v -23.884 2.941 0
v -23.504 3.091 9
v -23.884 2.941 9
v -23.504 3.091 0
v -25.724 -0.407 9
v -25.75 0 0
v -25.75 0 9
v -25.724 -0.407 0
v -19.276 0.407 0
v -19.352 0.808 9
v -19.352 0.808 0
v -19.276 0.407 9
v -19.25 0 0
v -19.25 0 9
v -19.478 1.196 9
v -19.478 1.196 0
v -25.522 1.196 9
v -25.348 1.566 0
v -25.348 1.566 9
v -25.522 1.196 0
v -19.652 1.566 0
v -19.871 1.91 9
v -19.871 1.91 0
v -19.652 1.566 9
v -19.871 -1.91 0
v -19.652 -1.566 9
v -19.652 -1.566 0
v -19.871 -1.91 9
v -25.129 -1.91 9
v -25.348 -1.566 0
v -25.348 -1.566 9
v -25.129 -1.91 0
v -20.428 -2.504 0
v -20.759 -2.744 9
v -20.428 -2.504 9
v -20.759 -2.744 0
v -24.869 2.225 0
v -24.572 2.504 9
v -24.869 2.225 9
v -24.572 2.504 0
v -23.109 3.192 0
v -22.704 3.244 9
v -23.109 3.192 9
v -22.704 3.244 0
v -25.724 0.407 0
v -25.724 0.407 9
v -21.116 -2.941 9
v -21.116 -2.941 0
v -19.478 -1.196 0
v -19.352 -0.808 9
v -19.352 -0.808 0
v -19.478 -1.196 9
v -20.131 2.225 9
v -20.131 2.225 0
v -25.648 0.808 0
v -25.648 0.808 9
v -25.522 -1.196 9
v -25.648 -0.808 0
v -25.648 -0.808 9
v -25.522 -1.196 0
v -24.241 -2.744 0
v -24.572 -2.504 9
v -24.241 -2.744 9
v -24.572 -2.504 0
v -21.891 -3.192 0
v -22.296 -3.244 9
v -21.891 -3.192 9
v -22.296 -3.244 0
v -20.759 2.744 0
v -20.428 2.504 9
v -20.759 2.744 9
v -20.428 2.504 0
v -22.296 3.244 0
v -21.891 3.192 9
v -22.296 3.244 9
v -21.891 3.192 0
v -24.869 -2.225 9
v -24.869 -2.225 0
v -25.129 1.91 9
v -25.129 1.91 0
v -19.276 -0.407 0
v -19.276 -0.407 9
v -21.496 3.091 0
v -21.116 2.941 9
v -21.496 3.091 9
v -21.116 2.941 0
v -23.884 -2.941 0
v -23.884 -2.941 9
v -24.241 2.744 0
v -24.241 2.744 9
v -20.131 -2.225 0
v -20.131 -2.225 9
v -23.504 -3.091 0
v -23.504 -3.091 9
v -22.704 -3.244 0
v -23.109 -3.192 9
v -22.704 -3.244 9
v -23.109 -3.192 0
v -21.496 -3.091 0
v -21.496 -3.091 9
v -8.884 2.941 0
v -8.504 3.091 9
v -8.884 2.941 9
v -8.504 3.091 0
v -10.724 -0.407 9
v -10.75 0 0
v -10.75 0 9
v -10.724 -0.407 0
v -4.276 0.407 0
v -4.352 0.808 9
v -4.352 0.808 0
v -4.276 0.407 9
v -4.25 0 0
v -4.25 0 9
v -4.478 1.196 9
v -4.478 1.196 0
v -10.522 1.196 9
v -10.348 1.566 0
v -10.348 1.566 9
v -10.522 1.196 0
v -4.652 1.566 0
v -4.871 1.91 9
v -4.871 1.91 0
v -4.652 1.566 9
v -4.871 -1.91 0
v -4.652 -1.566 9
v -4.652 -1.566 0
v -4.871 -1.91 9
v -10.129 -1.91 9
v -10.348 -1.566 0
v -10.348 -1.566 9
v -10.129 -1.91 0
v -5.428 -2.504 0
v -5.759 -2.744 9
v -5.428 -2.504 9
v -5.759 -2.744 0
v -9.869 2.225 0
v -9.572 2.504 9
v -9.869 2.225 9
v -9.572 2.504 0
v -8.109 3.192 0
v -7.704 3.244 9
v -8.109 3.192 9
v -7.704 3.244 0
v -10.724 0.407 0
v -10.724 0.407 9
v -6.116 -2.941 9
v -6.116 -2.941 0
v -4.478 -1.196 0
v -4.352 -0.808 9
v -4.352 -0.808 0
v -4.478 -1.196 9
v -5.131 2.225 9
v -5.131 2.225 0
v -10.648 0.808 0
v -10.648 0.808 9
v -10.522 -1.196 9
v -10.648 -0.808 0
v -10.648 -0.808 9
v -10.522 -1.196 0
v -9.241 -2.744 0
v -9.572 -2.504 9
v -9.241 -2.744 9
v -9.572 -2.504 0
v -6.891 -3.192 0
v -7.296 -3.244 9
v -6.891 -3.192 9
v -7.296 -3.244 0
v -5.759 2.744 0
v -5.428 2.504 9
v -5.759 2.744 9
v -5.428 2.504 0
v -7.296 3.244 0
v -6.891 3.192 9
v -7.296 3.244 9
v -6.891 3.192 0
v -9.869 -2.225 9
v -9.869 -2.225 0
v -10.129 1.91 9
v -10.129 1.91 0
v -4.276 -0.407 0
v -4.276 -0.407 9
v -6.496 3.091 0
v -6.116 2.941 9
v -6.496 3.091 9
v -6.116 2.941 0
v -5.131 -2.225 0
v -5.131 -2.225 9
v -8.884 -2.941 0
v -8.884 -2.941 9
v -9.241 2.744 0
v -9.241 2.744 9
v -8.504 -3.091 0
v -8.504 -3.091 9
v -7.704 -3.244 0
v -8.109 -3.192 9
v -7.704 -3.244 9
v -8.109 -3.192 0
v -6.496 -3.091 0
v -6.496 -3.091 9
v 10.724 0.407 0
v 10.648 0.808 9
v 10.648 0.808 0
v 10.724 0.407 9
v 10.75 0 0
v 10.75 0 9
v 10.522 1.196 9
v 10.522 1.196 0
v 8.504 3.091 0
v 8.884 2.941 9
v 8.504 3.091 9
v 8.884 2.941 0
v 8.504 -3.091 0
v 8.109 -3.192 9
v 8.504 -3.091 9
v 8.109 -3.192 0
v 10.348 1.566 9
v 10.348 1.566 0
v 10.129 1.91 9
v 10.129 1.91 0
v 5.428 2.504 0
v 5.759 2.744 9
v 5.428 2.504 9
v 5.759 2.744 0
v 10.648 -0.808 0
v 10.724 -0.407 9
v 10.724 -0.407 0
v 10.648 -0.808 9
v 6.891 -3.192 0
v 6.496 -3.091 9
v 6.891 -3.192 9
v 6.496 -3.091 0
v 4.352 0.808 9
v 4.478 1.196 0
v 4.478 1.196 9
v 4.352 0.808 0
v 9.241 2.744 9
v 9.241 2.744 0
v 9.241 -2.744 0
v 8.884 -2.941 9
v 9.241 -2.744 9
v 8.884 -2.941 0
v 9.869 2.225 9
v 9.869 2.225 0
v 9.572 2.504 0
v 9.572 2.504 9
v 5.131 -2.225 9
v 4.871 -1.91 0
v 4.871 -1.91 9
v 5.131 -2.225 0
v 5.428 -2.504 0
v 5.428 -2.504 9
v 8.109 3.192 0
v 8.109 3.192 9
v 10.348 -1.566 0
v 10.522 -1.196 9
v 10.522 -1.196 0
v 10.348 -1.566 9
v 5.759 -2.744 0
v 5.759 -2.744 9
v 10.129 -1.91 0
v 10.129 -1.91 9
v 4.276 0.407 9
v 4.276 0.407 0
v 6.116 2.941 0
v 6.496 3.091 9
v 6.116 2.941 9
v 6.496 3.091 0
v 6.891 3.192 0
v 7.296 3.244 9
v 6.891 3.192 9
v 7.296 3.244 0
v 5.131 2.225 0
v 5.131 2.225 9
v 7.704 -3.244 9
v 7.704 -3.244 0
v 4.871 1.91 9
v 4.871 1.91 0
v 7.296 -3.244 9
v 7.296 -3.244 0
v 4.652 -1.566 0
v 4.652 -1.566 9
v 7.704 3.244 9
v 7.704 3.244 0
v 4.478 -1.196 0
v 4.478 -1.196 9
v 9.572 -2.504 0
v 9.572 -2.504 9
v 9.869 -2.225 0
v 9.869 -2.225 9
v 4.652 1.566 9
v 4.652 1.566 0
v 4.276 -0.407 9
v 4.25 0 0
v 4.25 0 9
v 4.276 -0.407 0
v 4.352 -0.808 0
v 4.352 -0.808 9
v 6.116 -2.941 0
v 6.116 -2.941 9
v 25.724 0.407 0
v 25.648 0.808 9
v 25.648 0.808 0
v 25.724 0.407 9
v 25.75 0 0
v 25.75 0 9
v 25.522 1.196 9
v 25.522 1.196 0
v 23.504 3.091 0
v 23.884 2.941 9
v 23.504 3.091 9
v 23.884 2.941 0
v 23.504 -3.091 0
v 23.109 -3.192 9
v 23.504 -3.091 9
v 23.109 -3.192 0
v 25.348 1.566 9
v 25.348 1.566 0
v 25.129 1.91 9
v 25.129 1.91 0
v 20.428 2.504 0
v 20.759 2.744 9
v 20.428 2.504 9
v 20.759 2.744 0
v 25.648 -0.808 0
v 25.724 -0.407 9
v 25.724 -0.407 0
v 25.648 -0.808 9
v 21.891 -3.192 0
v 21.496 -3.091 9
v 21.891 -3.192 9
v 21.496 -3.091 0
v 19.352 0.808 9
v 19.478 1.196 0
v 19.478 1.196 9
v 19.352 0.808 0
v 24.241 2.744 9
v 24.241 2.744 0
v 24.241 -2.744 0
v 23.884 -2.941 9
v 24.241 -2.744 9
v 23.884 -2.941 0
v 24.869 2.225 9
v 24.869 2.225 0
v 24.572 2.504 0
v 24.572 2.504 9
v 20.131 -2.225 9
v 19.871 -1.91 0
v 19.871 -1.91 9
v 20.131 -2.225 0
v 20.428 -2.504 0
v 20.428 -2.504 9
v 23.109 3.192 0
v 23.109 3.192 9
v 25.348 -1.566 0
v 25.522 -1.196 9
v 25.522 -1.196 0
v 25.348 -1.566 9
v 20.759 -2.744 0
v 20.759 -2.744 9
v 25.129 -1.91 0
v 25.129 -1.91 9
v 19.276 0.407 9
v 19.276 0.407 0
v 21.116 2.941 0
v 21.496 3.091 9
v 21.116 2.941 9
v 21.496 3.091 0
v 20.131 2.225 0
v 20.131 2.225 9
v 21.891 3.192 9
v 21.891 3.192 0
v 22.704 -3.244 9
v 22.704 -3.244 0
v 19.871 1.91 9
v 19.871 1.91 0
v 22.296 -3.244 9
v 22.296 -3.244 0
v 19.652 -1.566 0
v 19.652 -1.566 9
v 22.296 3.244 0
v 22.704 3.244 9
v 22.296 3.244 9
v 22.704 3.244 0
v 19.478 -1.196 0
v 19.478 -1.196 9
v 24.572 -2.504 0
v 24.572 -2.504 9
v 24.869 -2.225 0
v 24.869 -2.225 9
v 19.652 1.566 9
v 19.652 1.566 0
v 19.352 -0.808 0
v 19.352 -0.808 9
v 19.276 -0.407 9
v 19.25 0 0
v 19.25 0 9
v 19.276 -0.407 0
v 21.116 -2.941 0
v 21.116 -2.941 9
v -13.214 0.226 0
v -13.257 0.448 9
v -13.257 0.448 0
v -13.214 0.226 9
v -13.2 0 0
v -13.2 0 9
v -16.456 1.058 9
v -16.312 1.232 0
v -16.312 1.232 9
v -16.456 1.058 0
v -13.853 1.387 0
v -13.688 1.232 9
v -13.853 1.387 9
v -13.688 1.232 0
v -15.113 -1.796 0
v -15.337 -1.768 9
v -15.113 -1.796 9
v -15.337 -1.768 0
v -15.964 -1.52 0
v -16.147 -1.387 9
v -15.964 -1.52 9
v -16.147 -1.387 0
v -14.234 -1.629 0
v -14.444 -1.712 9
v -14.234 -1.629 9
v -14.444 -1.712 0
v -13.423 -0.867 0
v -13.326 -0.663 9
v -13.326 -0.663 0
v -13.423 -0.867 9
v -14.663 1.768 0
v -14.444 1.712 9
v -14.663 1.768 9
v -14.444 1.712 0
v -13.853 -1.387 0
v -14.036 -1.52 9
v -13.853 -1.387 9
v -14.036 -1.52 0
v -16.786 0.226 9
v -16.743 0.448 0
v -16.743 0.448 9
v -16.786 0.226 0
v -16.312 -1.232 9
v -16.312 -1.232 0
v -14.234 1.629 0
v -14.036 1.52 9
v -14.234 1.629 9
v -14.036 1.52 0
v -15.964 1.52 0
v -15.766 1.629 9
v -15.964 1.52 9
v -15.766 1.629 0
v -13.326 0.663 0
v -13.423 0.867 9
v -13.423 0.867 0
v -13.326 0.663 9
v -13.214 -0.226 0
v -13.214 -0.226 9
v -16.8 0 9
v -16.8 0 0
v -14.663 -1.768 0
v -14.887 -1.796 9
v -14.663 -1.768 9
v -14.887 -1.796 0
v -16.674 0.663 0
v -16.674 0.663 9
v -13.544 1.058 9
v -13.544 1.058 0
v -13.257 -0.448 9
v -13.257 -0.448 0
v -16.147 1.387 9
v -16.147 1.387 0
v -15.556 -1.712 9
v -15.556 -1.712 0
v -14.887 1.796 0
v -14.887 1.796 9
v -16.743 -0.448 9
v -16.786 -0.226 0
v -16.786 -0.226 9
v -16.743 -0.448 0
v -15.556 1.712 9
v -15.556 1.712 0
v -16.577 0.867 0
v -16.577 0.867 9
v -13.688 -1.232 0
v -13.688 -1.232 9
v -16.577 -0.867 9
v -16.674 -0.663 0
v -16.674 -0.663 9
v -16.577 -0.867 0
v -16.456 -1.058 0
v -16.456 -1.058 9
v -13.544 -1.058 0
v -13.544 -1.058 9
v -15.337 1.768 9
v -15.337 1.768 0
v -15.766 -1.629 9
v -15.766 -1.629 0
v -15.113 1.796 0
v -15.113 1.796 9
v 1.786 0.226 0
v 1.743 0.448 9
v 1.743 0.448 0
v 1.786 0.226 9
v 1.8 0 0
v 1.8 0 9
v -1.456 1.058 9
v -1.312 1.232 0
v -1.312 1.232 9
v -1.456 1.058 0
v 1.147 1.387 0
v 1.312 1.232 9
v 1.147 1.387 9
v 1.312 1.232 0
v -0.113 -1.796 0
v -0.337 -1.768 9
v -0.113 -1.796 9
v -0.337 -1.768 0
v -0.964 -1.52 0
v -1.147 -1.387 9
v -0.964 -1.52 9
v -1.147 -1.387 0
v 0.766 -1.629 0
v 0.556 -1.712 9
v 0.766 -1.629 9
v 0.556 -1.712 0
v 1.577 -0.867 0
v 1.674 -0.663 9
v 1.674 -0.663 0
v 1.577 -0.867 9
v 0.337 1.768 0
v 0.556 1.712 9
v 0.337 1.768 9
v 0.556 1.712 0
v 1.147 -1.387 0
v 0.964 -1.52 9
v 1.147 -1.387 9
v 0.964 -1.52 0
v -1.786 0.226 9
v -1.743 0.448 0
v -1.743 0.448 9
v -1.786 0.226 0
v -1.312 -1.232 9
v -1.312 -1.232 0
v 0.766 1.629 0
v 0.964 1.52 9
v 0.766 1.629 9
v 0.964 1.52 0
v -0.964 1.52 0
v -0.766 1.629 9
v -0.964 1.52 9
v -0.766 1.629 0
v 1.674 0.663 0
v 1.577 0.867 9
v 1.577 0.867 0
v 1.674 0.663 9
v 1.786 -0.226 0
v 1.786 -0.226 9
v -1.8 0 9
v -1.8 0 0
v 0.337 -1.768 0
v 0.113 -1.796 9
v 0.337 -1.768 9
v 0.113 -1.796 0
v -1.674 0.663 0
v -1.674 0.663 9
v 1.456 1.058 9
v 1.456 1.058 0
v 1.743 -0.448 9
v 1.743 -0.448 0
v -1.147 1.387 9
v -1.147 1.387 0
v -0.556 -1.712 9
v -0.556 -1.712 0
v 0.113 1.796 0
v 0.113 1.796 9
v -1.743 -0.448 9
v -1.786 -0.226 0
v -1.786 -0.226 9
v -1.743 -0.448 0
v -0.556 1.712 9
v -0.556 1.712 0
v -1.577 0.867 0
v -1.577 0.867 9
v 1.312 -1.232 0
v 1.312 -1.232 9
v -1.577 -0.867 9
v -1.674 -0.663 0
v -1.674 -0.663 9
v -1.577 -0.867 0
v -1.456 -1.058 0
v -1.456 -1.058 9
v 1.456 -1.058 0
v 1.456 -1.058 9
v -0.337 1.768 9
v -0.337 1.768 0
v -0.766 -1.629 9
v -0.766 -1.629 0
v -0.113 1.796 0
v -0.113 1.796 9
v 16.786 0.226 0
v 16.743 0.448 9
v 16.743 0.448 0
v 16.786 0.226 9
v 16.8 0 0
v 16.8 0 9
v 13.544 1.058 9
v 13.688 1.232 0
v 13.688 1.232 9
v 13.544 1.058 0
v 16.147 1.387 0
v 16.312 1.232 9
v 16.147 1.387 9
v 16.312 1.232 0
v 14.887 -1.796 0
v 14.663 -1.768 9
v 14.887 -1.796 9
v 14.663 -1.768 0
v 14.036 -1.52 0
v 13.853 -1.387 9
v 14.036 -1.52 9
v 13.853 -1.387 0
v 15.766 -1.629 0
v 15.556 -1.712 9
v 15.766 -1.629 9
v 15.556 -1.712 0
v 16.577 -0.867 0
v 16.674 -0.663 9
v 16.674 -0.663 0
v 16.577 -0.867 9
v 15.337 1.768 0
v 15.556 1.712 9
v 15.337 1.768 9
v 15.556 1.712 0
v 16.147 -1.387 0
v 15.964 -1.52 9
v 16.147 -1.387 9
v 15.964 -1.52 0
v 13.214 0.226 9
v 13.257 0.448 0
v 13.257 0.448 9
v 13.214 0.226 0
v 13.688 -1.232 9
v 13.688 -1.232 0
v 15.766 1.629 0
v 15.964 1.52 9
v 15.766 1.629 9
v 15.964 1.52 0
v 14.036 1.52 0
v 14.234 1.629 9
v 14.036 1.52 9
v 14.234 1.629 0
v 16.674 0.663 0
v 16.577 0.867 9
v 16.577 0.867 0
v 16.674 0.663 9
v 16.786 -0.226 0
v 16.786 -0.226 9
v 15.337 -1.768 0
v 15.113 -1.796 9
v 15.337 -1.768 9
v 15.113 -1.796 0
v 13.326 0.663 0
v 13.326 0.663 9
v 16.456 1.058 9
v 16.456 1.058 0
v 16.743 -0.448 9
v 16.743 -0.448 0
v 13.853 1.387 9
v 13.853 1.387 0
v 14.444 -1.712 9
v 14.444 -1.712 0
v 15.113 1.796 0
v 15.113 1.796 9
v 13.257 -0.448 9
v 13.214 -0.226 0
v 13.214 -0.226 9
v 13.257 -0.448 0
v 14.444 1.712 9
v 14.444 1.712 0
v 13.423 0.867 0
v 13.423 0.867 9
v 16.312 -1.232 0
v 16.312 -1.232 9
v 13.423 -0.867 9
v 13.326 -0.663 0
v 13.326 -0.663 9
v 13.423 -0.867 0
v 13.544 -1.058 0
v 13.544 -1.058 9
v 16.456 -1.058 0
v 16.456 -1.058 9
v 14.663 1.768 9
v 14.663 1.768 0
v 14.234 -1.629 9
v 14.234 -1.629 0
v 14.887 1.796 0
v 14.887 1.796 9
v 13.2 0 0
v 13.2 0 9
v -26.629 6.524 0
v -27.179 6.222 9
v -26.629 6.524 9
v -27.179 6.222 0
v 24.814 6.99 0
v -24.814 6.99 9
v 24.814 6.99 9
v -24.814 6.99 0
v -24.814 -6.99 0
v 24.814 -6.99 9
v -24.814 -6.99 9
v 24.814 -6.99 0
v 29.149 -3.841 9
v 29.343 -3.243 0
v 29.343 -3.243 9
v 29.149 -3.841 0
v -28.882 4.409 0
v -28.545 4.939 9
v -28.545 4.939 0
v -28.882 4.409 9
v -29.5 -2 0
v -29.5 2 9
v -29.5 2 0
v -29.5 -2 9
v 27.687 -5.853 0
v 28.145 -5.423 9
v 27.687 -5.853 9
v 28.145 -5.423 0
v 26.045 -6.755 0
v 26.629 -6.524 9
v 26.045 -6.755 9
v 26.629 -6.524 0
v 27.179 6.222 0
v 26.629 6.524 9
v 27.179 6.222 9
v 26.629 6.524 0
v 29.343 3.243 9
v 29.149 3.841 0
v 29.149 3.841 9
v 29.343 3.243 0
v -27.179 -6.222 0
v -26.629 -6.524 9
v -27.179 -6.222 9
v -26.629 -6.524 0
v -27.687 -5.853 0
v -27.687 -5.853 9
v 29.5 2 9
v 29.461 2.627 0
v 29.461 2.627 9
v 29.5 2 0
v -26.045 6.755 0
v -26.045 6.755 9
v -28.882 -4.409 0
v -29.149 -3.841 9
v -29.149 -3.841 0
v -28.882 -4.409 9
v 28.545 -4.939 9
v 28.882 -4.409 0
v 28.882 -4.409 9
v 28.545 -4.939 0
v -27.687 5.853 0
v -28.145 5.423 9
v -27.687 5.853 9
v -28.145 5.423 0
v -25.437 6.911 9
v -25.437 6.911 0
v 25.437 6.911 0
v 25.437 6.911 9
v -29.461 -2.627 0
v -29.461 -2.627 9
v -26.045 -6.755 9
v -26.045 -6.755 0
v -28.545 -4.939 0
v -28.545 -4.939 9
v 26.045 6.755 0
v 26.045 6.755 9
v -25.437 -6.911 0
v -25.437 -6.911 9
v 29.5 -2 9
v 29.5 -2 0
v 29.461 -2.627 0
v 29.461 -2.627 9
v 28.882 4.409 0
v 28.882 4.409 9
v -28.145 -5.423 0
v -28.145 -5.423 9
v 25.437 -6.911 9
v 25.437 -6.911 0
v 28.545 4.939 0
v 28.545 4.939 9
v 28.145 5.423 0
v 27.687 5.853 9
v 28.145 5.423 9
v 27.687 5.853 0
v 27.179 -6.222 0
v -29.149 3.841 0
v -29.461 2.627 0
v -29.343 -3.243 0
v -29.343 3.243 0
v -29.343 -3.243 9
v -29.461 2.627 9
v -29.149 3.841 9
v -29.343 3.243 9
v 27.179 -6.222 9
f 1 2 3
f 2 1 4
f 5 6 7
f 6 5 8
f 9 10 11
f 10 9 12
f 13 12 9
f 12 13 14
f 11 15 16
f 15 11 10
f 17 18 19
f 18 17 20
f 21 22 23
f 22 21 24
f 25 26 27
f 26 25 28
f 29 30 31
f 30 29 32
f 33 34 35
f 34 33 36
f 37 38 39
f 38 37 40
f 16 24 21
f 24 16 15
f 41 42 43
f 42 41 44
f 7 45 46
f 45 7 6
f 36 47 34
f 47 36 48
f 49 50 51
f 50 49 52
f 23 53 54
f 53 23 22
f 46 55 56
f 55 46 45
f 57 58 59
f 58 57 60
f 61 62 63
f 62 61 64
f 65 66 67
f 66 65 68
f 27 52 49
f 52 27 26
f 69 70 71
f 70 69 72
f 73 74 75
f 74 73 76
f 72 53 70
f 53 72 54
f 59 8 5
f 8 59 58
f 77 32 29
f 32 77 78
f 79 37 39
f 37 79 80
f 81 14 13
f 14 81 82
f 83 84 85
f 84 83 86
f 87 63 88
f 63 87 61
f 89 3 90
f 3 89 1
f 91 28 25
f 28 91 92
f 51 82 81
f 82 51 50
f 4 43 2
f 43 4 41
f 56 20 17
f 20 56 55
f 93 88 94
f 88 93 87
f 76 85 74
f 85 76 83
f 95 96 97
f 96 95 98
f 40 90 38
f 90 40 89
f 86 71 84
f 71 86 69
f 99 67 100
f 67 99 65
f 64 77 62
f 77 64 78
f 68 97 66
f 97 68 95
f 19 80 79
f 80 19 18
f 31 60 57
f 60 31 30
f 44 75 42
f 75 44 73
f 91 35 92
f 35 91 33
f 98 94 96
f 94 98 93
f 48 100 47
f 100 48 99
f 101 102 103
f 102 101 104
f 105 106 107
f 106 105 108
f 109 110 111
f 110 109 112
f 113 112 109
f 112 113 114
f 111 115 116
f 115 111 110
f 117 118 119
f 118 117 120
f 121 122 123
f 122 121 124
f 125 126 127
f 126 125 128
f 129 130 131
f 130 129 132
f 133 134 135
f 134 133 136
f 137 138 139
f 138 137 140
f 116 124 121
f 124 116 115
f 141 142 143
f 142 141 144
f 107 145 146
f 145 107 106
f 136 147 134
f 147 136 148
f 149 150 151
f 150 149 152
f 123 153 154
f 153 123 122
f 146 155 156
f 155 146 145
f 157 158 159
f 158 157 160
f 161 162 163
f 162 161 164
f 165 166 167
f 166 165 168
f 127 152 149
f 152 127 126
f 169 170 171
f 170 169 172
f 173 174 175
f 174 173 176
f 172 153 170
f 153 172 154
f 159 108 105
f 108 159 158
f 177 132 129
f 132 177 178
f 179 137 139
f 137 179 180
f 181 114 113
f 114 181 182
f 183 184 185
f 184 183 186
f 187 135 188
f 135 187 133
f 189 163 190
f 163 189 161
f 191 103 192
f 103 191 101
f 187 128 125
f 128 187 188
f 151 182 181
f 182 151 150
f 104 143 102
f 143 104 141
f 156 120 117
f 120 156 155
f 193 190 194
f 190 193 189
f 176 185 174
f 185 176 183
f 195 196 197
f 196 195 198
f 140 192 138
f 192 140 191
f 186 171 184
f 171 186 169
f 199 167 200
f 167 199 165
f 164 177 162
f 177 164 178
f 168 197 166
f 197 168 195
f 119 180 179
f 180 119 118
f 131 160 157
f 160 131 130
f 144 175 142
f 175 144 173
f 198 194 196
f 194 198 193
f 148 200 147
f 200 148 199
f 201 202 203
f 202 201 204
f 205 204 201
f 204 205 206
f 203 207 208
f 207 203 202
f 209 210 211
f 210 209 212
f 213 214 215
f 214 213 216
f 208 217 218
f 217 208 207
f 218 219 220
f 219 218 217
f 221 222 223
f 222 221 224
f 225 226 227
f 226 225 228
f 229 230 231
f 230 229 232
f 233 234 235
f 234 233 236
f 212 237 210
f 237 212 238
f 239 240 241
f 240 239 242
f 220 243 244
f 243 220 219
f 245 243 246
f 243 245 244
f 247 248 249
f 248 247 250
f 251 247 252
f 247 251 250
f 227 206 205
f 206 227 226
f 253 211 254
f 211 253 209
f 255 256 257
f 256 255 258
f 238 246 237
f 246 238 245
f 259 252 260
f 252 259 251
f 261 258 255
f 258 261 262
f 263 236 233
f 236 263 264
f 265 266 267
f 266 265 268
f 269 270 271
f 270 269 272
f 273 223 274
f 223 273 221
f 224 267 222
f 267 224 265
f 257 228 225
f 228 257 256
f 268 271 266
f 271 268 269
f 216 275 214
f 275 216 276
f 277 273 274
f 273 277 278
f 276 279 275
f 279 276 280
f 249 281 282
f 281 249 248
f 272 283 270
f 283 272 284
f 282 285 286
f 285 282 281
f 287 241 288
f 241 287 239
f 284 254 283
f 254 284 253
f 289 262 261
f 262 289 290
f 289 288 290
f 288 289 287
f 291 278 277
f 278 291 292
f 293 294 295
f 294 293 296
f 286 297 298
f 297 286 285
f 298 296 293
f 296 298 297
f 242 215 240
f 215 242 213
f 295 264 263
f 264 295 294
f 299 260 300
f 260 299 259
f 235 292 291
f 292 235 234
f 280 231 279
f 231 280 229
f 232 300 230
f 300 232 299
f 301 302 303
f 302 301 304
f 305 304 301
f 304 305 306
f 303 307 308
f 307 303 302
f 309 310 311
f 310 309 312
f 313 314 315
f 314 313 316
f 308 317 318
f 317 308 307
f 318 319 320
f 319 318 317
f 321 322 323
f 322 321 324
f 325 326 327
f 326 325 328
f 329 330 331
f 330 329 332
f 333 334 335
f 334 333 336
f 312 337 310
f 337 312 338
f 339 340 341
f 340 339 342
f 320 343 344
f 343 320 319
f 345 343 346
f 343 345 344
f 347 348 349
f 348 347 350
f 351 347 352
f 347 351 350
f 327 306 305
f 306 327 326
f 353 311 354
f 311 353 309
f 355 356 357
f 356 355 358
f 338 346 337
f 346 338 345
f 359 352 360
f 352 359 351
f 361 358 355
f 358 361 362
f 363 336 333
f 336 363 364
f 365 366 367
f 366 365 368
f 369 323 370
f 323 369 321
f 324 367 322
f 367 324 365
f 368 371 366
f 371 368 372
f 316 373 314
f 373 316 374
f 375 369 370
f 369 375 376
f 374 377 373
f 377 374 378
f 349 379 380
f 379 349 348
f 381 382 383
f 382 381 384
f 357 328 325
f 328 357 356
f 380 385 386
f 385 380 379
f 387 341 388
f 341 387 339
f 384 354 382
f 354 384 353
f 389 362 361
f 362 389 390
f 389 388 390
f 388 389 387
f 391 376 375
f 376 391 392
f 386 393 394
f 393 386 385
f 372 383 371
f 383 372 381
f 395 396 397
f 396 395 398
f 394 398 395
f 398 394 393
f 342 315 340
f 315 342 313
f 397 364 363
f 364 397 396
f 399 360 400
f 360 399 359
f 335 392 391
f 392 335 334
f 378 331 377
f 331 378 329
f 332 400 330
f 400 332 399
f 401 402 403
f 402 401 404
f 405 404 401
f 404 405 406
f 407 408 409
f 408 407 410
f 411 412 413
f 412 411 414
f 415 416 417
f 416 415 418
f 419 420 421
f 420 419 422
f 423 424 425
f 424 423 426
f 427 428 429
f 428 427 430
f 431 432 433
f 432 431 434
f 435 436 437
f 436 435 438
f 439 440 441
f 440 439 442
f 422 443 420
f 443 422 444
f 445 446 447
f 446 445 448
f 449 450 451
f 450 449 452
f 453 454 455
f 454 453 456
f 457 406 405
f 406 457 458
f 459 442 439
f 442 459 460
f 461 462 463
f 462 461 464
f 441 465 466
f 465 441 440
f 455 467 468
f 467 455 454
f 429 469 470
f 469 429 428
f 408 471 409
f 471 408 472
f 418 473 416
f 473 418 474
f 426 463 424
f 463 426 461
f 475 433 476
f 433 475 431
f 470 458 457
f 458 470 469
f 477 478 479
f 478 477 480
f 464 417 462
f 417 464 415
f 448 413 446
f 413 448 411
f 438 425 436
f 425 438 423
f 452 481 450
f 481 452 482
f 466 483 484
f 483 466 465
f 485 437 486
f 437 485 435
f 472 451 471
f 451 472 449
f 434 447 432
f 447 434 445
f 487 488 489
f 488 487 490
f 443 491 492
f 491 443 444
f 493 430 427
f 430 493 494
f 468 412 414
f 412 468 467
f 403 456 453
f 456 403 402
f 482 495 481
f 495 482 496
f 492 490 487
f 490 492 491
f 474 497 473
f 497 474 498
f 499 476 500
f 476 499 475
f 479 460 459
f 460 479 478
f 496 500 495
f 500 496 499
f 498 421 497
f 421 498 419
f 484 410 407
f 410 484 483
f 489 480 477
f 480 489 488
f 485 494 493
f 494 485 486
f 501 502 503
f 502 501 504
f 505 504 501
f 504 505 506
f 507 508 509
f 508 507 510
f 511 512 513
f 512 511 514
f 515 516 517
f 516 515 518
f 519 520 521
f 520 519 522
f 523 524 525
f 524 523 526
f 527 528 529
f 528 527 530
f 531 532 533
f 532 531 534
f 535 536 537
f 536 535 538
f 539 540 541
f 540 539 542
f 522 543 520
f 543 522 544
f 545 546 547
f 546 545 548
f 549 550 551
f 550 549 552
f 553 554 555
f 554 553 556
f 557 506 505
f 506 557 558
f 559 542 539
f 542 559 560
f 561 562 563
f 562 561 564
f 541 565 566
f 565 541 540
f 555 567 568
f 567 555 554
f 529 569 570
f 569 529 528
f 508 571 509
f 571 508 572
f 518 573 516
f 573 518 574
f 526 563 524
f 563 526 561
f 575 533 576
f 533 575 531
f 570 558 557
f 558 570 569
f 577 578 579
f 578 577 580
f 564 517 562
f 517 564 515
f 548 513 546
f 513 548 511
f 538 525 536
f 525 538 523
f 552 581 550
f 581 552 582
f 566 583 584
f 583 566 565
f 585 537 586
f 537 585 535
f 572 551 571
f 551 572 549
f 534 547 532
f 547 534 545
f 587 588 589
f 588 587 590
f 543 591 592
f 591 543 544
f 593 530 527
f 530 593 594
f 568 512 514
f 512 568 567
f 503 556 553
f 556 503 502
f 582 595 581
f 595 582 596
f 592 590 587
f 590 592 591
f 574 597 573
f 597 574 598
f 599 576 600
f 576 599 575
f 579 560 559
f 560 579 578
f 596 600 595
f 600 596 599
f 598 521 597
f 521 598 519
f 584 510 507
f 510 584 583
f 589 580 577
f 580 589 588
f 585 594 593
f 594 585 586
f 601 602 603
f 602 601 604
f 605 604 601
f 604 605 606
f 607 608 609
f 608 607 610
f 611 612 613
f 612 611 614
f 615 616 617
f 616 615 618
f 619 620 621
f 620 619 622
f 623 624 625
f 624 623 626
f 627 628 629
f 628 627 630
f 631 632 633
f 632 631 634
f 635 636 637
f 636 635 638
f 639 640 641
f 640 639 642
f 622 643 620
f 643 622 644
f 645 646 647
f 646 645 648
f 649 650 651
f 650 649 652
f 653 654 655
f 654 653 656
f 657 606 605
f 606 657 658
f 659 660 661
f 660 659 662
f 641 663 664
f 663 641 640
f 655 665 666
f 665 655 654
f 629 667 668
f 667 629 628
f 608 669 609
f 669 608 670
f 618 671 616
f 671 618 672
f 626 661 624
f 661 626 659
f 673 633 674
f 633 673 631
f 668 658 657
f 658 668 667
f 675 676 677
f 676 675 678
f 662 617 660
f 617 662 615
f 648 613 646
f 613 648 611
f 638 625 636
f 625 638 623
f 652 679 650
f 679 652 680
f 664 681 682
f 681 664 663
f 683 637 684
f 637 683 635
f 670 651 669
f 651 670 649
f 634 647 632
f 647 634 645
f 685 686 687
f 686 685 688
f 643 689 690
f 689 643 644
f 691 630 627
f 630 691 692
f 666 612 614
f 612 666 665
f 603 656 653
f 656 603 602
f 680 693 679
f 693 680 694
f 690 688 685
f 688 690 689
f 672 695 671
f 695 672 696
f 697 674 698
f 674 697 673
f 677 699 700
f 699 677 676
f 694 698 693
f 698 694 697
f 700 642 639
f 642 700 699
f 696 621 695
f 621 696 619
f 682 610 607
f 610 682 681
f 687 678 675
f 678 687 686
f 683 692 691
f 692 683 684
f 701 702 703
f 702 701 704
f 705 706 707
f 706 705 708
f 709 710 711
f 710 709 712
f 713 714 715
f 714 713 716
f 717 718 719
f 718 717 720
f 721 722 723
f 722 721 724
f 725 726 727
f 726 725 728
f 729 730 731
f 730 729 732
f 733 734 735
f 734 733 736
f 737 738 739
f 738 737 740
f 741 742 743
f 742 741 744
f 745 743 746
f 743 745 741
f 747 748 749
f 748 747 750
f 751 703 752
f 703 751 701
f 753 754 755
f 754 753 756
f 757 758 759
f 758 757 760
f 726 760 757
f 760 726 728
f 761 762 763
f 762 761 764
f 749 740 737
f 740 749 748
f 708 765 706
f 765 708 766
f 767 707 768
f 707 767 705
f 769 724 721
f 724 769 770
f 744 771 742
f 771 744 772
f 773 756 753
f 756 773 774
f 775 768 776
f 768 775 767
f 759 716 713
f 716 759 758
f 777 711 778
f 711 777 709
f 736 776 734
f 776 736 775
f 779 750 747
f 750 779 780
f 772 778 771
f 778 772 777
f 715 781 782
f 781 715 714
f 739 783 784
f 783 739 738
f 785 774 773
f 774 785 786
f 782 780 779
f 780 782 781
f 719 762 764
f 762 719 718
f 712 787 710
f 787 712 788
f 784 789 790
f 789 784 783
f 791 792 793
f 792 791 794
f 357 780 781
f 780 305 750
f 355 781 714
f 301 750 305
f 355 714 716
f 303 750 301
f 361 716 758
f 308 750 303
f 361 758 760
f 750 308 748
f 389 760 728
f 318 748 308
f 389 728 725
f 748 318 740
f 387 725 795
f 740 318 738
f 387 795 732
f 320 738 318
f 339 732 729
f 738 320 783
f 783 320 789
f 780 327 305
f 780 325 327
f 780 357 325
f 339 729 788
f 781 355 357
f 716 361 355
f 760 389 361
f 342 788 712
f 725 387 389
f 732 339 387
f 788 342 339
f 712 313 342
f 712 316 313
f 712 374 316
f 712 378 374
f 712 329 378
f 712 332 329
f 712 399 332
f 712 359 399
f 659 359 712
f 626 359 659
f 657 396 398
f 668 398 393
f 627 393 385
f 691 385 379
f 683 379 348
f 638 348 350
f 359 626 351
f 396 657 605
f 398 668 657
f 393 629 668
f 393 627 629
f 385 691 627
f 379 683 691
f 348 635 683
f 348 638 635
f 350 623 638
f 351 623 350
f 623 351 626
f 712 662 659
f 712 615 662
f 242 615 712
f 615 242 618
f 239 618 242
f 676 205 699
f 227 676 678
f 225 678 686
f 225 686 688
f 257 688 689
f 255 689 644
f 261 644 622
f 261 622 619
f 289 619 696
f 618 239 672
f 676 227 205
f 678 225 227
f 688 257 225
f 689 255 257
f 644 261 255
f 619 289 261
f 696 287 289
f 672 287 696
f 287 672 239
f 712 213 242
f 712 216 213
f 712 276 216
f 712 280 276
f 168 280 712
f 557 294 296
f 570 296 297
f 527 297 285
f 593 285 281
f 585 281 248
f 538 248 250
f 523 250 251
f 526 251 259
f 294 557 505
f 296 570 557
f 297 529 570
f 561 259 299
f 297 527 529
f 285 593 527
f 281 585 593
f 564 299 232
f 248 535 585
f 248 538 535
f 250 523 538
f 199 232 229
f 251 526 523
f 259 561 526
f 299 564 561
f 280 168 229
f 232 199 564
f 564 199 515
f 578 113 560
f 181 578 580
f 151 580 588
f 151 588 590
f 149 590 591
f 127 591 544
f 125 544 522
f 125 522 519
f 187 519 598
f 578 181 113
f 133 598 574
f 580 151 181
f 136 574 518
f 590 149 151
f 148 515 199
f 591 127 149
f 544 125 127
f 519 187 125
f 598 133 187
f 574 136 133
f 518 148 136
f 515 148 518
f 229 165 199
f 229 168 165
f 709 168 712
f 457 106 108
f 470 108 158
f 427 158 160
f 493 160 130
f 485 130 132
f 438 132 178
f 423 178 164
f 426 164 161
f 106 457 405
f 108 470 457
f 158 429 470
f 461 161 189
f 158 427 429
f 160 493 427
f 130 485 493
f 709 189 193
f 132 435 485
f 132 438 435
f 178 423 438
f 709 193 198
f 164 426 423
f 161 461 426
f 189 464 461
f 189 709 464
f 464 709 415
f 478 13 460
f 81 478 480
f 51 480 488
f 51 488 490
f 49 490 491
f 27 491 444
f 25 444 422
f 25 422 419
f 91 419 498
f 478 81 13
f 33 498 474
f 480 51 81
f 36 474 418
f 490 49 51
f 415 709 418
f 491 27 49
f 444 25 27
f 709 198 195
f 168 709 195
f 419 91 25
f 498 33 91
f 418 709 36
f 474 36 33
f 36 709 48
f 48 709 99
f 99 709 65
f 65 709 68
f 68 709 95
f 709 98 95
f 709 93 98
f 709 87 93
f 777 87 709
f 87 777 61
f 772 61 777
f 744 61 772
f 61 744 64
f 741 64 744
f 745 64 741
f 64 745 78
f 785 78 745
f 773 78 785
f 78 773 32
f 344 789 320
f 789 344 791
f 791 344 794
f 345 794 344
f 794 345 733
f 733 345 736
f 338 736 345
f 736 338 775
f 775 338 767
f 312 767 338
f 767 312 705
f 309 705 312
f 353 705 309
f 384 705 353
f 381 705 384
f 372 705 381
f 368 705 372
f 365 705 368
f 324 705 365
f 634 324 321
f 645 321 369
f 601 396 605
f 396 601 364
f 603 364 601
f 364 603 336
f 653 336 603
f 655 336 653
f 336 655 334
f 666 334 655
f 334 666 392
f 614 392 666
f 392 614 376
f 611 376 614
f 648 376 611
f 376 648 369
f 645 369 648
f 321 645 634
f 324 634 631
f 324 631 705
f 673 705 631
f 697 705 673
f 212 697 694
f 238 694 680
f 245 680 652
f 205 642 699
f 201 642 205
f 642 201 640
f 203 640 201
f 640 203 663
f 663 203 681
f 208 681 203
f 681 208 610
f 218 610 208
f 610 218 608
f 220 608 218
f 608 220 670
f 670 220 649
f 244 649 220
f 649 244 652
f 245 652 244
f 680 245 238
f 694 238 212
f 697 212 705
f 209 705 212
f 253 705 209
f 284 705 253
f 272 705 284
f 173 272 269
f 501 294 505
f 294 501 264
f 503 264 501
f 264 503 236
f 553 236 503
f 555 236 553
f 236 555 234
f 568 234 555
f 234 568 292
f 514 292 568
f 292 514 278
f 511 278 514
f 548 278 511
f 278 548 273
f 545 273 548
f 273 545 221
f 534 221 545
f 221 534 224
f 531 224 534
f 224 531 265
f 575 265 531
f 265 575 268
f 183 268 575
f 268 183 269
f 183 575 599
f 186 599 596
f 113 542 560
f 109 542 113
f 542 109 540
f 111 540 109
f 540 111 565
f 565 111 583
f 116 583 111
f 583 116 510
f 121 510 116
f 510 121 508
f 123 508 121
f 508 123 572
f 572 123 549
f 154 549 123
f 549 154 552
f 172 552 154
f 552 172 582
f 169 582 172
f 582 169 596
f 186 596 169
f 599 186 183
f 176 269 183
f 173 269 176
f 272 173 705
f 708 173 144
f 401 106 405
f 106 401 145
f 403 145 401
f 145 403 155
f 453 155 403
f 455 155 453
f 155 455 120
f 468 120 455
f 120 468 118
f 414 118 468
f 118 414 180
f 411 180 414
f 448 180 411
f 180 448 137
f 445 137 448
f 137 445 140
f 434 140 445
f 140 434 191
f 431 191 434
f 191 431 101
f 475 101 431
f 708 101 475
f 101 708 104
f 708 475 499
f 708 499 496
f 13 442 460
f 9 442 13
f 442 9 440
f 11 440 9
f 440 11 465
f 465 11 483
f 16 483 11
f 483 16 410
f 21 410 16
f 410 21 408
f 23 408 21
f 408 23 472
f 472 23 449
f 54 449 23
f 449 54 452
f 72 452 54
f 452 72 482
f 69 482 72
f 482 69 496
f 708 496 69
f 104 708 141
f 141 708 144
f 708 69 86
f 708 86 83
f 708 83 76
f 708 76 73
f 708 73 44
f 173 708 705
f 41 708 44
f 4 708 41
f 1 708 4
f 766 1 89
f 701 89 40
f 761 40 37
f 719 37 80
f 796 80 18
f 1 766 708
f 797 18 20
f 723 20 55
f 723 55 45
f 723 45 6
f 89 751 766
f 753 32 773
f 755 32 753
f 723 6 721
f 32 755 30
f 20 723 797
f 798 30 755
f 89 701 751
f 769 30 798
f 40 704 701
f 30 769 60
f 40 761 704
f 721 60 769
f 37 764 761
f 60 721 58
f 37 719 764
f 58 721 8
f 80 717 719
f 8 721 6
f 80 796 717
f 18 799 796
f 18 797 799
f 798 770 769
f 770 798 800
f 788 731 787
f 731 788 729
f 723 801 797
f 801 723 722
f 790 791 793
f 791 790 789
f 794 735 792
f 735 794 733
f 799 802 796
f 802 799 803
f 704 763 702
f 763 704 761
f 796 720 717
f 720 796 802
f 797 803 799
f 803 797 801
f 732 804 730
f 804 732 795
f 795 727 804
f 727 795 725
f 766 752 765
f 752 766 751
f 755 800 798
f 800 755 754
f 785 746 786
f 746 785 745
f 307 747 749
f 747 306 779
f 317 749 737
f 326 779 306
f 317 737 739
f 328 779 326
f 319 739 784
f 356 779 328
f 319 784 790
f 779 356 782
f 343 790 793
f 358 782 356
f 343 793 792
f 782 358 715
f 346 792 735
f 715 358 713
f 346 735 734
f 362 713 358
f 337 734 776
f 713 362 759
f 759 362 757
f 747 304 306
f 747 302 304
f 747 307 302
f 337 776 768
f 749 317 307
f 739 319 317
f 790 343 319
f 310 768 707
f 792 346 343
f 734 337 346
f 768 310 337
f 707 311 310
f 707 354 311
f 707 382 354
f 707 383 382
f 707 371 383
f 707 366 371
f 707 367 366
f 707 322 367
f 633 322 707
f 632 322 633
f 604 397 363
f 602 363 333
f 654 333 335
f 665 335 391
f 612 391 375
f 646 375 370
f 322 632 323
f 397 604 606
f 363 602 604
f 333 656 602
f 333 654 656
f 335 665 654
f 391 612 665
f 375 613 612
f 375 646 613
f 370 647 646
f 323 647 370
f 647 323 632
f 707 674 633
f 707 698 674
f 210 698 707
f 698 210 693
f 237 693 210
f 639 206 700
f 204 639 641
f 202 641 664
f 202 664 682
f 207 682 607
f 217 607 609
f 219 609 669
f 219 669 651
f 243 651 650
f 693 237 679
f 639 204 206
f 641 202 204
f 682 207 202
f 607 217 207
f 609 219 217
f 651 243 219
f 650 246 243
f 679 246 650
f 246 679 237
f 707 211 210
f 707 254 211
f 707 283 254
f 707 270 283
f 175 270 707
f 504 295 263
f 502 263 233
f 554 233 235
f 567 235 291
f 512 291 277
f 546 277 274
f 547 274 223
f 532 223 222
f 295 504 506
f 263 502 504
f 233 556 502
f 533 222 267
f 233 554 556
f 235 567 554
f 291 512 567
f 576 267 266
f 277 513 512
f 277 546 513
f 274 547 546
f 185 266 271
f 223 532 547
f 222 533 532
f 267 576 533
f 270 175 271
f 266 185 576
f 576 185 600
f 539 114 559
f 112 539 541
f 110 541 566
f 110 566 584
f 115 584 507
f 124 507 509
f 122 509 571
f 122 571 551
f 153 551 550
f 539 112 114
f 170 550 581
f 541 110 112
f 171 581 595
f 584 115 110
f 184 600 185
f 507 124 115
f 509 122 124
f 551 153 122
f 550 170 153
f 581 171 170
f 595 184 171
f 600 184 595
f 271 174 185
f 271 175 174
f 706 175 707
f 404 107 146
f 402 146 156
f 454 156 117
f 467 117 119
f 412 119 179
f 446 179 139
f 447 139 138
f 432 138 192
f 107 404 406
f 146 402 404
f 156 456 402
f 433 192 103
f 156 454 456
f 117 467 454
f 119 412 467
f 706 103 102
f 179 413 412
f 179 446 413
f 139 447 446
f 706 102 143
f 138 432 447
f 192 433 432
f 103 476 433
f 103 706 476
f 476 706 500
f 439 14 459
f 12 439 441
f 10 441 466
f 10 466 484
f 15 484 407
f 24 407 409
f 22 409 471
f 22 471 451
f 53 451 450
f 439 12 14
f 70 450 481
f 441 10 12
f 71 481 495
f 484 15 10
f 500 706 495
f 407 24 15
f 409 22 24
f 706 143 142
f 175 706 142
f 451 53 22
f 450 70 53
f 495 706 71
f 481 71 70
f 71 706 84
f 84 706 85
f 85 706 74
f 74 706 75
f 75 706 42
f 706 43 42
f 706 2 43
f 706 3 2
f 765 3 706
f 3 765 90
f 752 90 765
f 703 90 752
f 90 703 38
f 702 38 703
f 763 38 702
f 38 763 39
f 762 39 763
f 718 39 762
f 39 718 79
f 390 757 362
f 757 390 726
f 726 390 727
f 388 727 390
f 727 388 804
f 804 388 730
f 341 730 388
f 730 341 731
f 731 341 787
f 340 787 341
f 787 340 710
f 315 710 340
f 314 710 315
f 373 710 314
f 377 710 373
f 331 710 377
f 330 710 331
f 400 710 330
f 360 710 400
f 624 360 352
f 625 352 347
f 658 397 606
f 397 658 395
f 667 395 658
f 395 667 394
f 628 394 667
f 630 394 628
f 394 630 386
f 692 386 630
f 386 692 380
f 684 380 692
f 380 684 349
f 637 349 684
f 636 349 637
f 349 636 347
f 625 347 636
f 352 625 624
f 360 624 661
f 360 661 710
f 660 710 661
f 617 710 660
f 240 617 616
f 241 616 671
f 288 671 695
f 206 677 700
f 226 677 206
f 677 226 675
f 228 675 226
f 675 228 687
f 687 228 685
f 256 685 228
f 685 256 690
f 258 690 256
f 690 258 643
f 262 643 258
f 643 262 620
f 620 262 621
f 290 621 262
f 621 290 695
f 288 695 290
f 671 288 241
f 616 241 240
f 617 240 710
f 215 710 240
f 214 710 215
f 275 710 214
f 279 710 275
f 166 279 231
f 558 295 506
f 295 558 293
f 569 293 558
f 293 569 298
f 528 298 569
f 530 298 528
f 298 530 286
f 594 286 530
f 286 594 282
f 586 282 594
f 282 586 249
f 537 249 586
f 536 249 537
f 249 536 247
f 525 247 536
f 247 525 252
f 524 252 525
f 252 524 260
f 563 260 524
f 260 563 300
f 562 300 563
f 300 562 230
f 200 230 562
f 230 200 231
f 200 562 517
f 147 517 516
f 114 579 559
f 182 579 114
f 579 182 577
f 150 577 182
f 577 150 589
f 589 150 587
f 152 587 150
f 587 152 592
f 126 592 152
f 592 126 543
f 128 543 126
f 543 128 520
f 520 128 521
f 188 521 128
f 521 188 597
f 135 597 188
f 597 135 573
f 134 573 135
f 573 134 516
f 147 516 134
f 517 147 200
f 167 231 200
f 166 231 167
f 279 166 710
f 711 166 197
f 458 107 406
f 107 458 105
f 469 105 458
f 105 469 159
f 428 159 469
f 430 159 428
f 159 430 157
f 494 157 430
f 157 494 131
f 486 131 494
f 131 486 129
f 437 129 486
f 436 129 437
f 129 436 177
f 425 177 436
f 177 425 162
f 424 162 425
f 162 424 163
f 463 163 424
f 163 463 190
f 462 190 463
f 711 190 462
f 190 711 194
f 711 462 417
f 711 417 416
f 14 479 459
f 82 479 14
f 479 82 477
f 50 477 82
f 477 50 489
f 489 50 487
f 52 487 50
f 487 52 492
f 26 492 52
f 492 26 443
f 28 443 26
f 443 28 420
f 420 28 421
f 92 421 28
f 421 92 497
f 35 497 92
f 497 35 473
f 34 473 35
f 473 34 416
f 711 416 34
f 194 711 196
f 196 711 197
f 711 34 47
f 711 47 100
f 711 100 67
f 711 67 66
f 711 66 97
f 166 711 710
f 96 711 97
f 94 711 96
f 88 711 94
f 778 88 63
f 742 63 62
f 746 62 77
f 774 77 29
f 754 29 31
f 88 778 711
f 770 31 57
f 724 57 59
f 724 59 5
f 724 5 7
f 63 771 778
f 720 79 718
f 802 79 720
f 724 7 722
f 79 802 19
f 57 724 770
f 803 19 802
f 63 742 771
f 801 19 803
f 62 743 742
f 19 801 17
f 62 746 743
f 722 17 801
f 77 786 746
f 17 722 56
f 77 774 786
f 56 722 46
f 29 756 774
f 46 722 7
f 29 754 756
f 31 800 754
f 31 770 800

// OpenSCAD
$fn = 50;


difference() {
	union() {
		*color(alpha = 1.0000000000, c = "gray") {
			translate(v = [0, 7, 0]) {
				linear_extrude(height = 1) {
					text(font = "Arial:style=Bold", halign = "center", size = 4.5000000000, text = "COMMENT plate main", valign = "center");
				}
			}
		}
		*color(alpha = 1.0000000000, c = "gray") {
			translate(v = [0, 14, 0]) {
				linear_extrude(height = 1) {
					text(font = "Arial:style=Bold", halign = "center", size = 4.5000000000, text = "COMMENT description oobb_plate_shape_p_type_9_depth_4_width_1_height_9_thickness_true_both_holes", valign = "center");
				}
			}
		}
		hull() {
			translate(v = [-24.5000000000, 2.0000000000, 0]) {
				cylinder(h = 9, r = 5);
			}
			translate(v = [24.5000000000, 2.0000000000, 0]) {
				cylinder(h = 9, r = 5);
			}
			translate(v = [-24.5000000000, -2.0000000000, 0]) {
				cylinder(h = 9, r = 5);
			}
			translate(v = [24.5000000000, -2.0000000000, 0]) {
				cylinder(h = 9, r = 5);
			}
		}
	}
	union() {
		*color(alpha = 1.0000000000, c = "gray") {
			translate(v = [0, 7, 0]) {
				linear_extrude(height = 1) {
					text(font = "Arial:style=Bold", halign = "center", size = 4.5000000000, text = "COMMENT holes main", valign = "center");
				}
			}
		}
		*color(alpha = 1.0000000000, c = "gray") {
			translate(v = [0, 14, 0]) {
				linear_extrude(height = 1) {
					text(font = "Arial:style=Bold", halign = "center", size = 4.5000000000, text = "COMMENT description oobb_holes_shape_n_type_4_width_1_height_9_thickness_true_both_holes", valign = "center");
				}
			}
		}
		translate(v = [-22.5000000000, 0.0000000000, 0]) {
			translate(v = [0, 0, -50]) {
				cylinder(h = 100, r = 3.2500000000);
			}
		}
		translate(v = [-7.5000000000, 0.0000000000, 0]) {
			translate(v = [0, 0, -50]) {
				cylinder(h = 100, r = 3.2500000000);
			}
		}
		translate(v = [7.5000000000, 0.0000000000, 0]) {
			translate(v = [0, 0, -50]) {
				cylinder(h = 100, r = 3.2500000000);
			}
		}
		translate(v = [22.5000000000, 0.0000000000, 0]) {
			translate(v = [0, 0, -50]) {
				cylinder(h = 100, r = 3.2500000000);
			}
		}
		translate(v = [-22.5000000000, 0.0000000000, 0]) {
			translate(v = [0, 0, -50]) {
				cylinder(h = 100, r = 1.8000000000);
			}
		}
		translate(v = [-15.0000000000, 0.0000000000, 0]) {
			translate(v = [0, 0, -50]) {
				cylinder(h = 100, r = 1.8000000000);
			}
		}
		translate(v = [-7.5000000000, 0.0000000000, 0]) {
			translate(v = [0, 0, -50]) {
				cylinder(h = 100, r = 1.8000000000);
			}
		}
		translate(v = [0, 0, -50]) {
			cylinder(h = 100, r = 1.8000000000);
		}
		translate(v = [7.5000000000, 0.0000000000, 0]) {
			translate(v = [0, 0, -50]) {
				cylinder(h = 100, r = 1.8000000000);
			}
		}
		translate(v = [15.0000000000, 0.0000000000, 0]) {
			translate(v = [0, 0, -50]) {
				cylinder(h = 100, r = 1.8000000000);
			}
		}
		translate(v = [22.5000000000, 0.0000000000, 0]) {
			translate(v = [0, 0, -50]) {
				cylinder(h = 100, r = 1.8000000000);
			}
		}
	}
}
